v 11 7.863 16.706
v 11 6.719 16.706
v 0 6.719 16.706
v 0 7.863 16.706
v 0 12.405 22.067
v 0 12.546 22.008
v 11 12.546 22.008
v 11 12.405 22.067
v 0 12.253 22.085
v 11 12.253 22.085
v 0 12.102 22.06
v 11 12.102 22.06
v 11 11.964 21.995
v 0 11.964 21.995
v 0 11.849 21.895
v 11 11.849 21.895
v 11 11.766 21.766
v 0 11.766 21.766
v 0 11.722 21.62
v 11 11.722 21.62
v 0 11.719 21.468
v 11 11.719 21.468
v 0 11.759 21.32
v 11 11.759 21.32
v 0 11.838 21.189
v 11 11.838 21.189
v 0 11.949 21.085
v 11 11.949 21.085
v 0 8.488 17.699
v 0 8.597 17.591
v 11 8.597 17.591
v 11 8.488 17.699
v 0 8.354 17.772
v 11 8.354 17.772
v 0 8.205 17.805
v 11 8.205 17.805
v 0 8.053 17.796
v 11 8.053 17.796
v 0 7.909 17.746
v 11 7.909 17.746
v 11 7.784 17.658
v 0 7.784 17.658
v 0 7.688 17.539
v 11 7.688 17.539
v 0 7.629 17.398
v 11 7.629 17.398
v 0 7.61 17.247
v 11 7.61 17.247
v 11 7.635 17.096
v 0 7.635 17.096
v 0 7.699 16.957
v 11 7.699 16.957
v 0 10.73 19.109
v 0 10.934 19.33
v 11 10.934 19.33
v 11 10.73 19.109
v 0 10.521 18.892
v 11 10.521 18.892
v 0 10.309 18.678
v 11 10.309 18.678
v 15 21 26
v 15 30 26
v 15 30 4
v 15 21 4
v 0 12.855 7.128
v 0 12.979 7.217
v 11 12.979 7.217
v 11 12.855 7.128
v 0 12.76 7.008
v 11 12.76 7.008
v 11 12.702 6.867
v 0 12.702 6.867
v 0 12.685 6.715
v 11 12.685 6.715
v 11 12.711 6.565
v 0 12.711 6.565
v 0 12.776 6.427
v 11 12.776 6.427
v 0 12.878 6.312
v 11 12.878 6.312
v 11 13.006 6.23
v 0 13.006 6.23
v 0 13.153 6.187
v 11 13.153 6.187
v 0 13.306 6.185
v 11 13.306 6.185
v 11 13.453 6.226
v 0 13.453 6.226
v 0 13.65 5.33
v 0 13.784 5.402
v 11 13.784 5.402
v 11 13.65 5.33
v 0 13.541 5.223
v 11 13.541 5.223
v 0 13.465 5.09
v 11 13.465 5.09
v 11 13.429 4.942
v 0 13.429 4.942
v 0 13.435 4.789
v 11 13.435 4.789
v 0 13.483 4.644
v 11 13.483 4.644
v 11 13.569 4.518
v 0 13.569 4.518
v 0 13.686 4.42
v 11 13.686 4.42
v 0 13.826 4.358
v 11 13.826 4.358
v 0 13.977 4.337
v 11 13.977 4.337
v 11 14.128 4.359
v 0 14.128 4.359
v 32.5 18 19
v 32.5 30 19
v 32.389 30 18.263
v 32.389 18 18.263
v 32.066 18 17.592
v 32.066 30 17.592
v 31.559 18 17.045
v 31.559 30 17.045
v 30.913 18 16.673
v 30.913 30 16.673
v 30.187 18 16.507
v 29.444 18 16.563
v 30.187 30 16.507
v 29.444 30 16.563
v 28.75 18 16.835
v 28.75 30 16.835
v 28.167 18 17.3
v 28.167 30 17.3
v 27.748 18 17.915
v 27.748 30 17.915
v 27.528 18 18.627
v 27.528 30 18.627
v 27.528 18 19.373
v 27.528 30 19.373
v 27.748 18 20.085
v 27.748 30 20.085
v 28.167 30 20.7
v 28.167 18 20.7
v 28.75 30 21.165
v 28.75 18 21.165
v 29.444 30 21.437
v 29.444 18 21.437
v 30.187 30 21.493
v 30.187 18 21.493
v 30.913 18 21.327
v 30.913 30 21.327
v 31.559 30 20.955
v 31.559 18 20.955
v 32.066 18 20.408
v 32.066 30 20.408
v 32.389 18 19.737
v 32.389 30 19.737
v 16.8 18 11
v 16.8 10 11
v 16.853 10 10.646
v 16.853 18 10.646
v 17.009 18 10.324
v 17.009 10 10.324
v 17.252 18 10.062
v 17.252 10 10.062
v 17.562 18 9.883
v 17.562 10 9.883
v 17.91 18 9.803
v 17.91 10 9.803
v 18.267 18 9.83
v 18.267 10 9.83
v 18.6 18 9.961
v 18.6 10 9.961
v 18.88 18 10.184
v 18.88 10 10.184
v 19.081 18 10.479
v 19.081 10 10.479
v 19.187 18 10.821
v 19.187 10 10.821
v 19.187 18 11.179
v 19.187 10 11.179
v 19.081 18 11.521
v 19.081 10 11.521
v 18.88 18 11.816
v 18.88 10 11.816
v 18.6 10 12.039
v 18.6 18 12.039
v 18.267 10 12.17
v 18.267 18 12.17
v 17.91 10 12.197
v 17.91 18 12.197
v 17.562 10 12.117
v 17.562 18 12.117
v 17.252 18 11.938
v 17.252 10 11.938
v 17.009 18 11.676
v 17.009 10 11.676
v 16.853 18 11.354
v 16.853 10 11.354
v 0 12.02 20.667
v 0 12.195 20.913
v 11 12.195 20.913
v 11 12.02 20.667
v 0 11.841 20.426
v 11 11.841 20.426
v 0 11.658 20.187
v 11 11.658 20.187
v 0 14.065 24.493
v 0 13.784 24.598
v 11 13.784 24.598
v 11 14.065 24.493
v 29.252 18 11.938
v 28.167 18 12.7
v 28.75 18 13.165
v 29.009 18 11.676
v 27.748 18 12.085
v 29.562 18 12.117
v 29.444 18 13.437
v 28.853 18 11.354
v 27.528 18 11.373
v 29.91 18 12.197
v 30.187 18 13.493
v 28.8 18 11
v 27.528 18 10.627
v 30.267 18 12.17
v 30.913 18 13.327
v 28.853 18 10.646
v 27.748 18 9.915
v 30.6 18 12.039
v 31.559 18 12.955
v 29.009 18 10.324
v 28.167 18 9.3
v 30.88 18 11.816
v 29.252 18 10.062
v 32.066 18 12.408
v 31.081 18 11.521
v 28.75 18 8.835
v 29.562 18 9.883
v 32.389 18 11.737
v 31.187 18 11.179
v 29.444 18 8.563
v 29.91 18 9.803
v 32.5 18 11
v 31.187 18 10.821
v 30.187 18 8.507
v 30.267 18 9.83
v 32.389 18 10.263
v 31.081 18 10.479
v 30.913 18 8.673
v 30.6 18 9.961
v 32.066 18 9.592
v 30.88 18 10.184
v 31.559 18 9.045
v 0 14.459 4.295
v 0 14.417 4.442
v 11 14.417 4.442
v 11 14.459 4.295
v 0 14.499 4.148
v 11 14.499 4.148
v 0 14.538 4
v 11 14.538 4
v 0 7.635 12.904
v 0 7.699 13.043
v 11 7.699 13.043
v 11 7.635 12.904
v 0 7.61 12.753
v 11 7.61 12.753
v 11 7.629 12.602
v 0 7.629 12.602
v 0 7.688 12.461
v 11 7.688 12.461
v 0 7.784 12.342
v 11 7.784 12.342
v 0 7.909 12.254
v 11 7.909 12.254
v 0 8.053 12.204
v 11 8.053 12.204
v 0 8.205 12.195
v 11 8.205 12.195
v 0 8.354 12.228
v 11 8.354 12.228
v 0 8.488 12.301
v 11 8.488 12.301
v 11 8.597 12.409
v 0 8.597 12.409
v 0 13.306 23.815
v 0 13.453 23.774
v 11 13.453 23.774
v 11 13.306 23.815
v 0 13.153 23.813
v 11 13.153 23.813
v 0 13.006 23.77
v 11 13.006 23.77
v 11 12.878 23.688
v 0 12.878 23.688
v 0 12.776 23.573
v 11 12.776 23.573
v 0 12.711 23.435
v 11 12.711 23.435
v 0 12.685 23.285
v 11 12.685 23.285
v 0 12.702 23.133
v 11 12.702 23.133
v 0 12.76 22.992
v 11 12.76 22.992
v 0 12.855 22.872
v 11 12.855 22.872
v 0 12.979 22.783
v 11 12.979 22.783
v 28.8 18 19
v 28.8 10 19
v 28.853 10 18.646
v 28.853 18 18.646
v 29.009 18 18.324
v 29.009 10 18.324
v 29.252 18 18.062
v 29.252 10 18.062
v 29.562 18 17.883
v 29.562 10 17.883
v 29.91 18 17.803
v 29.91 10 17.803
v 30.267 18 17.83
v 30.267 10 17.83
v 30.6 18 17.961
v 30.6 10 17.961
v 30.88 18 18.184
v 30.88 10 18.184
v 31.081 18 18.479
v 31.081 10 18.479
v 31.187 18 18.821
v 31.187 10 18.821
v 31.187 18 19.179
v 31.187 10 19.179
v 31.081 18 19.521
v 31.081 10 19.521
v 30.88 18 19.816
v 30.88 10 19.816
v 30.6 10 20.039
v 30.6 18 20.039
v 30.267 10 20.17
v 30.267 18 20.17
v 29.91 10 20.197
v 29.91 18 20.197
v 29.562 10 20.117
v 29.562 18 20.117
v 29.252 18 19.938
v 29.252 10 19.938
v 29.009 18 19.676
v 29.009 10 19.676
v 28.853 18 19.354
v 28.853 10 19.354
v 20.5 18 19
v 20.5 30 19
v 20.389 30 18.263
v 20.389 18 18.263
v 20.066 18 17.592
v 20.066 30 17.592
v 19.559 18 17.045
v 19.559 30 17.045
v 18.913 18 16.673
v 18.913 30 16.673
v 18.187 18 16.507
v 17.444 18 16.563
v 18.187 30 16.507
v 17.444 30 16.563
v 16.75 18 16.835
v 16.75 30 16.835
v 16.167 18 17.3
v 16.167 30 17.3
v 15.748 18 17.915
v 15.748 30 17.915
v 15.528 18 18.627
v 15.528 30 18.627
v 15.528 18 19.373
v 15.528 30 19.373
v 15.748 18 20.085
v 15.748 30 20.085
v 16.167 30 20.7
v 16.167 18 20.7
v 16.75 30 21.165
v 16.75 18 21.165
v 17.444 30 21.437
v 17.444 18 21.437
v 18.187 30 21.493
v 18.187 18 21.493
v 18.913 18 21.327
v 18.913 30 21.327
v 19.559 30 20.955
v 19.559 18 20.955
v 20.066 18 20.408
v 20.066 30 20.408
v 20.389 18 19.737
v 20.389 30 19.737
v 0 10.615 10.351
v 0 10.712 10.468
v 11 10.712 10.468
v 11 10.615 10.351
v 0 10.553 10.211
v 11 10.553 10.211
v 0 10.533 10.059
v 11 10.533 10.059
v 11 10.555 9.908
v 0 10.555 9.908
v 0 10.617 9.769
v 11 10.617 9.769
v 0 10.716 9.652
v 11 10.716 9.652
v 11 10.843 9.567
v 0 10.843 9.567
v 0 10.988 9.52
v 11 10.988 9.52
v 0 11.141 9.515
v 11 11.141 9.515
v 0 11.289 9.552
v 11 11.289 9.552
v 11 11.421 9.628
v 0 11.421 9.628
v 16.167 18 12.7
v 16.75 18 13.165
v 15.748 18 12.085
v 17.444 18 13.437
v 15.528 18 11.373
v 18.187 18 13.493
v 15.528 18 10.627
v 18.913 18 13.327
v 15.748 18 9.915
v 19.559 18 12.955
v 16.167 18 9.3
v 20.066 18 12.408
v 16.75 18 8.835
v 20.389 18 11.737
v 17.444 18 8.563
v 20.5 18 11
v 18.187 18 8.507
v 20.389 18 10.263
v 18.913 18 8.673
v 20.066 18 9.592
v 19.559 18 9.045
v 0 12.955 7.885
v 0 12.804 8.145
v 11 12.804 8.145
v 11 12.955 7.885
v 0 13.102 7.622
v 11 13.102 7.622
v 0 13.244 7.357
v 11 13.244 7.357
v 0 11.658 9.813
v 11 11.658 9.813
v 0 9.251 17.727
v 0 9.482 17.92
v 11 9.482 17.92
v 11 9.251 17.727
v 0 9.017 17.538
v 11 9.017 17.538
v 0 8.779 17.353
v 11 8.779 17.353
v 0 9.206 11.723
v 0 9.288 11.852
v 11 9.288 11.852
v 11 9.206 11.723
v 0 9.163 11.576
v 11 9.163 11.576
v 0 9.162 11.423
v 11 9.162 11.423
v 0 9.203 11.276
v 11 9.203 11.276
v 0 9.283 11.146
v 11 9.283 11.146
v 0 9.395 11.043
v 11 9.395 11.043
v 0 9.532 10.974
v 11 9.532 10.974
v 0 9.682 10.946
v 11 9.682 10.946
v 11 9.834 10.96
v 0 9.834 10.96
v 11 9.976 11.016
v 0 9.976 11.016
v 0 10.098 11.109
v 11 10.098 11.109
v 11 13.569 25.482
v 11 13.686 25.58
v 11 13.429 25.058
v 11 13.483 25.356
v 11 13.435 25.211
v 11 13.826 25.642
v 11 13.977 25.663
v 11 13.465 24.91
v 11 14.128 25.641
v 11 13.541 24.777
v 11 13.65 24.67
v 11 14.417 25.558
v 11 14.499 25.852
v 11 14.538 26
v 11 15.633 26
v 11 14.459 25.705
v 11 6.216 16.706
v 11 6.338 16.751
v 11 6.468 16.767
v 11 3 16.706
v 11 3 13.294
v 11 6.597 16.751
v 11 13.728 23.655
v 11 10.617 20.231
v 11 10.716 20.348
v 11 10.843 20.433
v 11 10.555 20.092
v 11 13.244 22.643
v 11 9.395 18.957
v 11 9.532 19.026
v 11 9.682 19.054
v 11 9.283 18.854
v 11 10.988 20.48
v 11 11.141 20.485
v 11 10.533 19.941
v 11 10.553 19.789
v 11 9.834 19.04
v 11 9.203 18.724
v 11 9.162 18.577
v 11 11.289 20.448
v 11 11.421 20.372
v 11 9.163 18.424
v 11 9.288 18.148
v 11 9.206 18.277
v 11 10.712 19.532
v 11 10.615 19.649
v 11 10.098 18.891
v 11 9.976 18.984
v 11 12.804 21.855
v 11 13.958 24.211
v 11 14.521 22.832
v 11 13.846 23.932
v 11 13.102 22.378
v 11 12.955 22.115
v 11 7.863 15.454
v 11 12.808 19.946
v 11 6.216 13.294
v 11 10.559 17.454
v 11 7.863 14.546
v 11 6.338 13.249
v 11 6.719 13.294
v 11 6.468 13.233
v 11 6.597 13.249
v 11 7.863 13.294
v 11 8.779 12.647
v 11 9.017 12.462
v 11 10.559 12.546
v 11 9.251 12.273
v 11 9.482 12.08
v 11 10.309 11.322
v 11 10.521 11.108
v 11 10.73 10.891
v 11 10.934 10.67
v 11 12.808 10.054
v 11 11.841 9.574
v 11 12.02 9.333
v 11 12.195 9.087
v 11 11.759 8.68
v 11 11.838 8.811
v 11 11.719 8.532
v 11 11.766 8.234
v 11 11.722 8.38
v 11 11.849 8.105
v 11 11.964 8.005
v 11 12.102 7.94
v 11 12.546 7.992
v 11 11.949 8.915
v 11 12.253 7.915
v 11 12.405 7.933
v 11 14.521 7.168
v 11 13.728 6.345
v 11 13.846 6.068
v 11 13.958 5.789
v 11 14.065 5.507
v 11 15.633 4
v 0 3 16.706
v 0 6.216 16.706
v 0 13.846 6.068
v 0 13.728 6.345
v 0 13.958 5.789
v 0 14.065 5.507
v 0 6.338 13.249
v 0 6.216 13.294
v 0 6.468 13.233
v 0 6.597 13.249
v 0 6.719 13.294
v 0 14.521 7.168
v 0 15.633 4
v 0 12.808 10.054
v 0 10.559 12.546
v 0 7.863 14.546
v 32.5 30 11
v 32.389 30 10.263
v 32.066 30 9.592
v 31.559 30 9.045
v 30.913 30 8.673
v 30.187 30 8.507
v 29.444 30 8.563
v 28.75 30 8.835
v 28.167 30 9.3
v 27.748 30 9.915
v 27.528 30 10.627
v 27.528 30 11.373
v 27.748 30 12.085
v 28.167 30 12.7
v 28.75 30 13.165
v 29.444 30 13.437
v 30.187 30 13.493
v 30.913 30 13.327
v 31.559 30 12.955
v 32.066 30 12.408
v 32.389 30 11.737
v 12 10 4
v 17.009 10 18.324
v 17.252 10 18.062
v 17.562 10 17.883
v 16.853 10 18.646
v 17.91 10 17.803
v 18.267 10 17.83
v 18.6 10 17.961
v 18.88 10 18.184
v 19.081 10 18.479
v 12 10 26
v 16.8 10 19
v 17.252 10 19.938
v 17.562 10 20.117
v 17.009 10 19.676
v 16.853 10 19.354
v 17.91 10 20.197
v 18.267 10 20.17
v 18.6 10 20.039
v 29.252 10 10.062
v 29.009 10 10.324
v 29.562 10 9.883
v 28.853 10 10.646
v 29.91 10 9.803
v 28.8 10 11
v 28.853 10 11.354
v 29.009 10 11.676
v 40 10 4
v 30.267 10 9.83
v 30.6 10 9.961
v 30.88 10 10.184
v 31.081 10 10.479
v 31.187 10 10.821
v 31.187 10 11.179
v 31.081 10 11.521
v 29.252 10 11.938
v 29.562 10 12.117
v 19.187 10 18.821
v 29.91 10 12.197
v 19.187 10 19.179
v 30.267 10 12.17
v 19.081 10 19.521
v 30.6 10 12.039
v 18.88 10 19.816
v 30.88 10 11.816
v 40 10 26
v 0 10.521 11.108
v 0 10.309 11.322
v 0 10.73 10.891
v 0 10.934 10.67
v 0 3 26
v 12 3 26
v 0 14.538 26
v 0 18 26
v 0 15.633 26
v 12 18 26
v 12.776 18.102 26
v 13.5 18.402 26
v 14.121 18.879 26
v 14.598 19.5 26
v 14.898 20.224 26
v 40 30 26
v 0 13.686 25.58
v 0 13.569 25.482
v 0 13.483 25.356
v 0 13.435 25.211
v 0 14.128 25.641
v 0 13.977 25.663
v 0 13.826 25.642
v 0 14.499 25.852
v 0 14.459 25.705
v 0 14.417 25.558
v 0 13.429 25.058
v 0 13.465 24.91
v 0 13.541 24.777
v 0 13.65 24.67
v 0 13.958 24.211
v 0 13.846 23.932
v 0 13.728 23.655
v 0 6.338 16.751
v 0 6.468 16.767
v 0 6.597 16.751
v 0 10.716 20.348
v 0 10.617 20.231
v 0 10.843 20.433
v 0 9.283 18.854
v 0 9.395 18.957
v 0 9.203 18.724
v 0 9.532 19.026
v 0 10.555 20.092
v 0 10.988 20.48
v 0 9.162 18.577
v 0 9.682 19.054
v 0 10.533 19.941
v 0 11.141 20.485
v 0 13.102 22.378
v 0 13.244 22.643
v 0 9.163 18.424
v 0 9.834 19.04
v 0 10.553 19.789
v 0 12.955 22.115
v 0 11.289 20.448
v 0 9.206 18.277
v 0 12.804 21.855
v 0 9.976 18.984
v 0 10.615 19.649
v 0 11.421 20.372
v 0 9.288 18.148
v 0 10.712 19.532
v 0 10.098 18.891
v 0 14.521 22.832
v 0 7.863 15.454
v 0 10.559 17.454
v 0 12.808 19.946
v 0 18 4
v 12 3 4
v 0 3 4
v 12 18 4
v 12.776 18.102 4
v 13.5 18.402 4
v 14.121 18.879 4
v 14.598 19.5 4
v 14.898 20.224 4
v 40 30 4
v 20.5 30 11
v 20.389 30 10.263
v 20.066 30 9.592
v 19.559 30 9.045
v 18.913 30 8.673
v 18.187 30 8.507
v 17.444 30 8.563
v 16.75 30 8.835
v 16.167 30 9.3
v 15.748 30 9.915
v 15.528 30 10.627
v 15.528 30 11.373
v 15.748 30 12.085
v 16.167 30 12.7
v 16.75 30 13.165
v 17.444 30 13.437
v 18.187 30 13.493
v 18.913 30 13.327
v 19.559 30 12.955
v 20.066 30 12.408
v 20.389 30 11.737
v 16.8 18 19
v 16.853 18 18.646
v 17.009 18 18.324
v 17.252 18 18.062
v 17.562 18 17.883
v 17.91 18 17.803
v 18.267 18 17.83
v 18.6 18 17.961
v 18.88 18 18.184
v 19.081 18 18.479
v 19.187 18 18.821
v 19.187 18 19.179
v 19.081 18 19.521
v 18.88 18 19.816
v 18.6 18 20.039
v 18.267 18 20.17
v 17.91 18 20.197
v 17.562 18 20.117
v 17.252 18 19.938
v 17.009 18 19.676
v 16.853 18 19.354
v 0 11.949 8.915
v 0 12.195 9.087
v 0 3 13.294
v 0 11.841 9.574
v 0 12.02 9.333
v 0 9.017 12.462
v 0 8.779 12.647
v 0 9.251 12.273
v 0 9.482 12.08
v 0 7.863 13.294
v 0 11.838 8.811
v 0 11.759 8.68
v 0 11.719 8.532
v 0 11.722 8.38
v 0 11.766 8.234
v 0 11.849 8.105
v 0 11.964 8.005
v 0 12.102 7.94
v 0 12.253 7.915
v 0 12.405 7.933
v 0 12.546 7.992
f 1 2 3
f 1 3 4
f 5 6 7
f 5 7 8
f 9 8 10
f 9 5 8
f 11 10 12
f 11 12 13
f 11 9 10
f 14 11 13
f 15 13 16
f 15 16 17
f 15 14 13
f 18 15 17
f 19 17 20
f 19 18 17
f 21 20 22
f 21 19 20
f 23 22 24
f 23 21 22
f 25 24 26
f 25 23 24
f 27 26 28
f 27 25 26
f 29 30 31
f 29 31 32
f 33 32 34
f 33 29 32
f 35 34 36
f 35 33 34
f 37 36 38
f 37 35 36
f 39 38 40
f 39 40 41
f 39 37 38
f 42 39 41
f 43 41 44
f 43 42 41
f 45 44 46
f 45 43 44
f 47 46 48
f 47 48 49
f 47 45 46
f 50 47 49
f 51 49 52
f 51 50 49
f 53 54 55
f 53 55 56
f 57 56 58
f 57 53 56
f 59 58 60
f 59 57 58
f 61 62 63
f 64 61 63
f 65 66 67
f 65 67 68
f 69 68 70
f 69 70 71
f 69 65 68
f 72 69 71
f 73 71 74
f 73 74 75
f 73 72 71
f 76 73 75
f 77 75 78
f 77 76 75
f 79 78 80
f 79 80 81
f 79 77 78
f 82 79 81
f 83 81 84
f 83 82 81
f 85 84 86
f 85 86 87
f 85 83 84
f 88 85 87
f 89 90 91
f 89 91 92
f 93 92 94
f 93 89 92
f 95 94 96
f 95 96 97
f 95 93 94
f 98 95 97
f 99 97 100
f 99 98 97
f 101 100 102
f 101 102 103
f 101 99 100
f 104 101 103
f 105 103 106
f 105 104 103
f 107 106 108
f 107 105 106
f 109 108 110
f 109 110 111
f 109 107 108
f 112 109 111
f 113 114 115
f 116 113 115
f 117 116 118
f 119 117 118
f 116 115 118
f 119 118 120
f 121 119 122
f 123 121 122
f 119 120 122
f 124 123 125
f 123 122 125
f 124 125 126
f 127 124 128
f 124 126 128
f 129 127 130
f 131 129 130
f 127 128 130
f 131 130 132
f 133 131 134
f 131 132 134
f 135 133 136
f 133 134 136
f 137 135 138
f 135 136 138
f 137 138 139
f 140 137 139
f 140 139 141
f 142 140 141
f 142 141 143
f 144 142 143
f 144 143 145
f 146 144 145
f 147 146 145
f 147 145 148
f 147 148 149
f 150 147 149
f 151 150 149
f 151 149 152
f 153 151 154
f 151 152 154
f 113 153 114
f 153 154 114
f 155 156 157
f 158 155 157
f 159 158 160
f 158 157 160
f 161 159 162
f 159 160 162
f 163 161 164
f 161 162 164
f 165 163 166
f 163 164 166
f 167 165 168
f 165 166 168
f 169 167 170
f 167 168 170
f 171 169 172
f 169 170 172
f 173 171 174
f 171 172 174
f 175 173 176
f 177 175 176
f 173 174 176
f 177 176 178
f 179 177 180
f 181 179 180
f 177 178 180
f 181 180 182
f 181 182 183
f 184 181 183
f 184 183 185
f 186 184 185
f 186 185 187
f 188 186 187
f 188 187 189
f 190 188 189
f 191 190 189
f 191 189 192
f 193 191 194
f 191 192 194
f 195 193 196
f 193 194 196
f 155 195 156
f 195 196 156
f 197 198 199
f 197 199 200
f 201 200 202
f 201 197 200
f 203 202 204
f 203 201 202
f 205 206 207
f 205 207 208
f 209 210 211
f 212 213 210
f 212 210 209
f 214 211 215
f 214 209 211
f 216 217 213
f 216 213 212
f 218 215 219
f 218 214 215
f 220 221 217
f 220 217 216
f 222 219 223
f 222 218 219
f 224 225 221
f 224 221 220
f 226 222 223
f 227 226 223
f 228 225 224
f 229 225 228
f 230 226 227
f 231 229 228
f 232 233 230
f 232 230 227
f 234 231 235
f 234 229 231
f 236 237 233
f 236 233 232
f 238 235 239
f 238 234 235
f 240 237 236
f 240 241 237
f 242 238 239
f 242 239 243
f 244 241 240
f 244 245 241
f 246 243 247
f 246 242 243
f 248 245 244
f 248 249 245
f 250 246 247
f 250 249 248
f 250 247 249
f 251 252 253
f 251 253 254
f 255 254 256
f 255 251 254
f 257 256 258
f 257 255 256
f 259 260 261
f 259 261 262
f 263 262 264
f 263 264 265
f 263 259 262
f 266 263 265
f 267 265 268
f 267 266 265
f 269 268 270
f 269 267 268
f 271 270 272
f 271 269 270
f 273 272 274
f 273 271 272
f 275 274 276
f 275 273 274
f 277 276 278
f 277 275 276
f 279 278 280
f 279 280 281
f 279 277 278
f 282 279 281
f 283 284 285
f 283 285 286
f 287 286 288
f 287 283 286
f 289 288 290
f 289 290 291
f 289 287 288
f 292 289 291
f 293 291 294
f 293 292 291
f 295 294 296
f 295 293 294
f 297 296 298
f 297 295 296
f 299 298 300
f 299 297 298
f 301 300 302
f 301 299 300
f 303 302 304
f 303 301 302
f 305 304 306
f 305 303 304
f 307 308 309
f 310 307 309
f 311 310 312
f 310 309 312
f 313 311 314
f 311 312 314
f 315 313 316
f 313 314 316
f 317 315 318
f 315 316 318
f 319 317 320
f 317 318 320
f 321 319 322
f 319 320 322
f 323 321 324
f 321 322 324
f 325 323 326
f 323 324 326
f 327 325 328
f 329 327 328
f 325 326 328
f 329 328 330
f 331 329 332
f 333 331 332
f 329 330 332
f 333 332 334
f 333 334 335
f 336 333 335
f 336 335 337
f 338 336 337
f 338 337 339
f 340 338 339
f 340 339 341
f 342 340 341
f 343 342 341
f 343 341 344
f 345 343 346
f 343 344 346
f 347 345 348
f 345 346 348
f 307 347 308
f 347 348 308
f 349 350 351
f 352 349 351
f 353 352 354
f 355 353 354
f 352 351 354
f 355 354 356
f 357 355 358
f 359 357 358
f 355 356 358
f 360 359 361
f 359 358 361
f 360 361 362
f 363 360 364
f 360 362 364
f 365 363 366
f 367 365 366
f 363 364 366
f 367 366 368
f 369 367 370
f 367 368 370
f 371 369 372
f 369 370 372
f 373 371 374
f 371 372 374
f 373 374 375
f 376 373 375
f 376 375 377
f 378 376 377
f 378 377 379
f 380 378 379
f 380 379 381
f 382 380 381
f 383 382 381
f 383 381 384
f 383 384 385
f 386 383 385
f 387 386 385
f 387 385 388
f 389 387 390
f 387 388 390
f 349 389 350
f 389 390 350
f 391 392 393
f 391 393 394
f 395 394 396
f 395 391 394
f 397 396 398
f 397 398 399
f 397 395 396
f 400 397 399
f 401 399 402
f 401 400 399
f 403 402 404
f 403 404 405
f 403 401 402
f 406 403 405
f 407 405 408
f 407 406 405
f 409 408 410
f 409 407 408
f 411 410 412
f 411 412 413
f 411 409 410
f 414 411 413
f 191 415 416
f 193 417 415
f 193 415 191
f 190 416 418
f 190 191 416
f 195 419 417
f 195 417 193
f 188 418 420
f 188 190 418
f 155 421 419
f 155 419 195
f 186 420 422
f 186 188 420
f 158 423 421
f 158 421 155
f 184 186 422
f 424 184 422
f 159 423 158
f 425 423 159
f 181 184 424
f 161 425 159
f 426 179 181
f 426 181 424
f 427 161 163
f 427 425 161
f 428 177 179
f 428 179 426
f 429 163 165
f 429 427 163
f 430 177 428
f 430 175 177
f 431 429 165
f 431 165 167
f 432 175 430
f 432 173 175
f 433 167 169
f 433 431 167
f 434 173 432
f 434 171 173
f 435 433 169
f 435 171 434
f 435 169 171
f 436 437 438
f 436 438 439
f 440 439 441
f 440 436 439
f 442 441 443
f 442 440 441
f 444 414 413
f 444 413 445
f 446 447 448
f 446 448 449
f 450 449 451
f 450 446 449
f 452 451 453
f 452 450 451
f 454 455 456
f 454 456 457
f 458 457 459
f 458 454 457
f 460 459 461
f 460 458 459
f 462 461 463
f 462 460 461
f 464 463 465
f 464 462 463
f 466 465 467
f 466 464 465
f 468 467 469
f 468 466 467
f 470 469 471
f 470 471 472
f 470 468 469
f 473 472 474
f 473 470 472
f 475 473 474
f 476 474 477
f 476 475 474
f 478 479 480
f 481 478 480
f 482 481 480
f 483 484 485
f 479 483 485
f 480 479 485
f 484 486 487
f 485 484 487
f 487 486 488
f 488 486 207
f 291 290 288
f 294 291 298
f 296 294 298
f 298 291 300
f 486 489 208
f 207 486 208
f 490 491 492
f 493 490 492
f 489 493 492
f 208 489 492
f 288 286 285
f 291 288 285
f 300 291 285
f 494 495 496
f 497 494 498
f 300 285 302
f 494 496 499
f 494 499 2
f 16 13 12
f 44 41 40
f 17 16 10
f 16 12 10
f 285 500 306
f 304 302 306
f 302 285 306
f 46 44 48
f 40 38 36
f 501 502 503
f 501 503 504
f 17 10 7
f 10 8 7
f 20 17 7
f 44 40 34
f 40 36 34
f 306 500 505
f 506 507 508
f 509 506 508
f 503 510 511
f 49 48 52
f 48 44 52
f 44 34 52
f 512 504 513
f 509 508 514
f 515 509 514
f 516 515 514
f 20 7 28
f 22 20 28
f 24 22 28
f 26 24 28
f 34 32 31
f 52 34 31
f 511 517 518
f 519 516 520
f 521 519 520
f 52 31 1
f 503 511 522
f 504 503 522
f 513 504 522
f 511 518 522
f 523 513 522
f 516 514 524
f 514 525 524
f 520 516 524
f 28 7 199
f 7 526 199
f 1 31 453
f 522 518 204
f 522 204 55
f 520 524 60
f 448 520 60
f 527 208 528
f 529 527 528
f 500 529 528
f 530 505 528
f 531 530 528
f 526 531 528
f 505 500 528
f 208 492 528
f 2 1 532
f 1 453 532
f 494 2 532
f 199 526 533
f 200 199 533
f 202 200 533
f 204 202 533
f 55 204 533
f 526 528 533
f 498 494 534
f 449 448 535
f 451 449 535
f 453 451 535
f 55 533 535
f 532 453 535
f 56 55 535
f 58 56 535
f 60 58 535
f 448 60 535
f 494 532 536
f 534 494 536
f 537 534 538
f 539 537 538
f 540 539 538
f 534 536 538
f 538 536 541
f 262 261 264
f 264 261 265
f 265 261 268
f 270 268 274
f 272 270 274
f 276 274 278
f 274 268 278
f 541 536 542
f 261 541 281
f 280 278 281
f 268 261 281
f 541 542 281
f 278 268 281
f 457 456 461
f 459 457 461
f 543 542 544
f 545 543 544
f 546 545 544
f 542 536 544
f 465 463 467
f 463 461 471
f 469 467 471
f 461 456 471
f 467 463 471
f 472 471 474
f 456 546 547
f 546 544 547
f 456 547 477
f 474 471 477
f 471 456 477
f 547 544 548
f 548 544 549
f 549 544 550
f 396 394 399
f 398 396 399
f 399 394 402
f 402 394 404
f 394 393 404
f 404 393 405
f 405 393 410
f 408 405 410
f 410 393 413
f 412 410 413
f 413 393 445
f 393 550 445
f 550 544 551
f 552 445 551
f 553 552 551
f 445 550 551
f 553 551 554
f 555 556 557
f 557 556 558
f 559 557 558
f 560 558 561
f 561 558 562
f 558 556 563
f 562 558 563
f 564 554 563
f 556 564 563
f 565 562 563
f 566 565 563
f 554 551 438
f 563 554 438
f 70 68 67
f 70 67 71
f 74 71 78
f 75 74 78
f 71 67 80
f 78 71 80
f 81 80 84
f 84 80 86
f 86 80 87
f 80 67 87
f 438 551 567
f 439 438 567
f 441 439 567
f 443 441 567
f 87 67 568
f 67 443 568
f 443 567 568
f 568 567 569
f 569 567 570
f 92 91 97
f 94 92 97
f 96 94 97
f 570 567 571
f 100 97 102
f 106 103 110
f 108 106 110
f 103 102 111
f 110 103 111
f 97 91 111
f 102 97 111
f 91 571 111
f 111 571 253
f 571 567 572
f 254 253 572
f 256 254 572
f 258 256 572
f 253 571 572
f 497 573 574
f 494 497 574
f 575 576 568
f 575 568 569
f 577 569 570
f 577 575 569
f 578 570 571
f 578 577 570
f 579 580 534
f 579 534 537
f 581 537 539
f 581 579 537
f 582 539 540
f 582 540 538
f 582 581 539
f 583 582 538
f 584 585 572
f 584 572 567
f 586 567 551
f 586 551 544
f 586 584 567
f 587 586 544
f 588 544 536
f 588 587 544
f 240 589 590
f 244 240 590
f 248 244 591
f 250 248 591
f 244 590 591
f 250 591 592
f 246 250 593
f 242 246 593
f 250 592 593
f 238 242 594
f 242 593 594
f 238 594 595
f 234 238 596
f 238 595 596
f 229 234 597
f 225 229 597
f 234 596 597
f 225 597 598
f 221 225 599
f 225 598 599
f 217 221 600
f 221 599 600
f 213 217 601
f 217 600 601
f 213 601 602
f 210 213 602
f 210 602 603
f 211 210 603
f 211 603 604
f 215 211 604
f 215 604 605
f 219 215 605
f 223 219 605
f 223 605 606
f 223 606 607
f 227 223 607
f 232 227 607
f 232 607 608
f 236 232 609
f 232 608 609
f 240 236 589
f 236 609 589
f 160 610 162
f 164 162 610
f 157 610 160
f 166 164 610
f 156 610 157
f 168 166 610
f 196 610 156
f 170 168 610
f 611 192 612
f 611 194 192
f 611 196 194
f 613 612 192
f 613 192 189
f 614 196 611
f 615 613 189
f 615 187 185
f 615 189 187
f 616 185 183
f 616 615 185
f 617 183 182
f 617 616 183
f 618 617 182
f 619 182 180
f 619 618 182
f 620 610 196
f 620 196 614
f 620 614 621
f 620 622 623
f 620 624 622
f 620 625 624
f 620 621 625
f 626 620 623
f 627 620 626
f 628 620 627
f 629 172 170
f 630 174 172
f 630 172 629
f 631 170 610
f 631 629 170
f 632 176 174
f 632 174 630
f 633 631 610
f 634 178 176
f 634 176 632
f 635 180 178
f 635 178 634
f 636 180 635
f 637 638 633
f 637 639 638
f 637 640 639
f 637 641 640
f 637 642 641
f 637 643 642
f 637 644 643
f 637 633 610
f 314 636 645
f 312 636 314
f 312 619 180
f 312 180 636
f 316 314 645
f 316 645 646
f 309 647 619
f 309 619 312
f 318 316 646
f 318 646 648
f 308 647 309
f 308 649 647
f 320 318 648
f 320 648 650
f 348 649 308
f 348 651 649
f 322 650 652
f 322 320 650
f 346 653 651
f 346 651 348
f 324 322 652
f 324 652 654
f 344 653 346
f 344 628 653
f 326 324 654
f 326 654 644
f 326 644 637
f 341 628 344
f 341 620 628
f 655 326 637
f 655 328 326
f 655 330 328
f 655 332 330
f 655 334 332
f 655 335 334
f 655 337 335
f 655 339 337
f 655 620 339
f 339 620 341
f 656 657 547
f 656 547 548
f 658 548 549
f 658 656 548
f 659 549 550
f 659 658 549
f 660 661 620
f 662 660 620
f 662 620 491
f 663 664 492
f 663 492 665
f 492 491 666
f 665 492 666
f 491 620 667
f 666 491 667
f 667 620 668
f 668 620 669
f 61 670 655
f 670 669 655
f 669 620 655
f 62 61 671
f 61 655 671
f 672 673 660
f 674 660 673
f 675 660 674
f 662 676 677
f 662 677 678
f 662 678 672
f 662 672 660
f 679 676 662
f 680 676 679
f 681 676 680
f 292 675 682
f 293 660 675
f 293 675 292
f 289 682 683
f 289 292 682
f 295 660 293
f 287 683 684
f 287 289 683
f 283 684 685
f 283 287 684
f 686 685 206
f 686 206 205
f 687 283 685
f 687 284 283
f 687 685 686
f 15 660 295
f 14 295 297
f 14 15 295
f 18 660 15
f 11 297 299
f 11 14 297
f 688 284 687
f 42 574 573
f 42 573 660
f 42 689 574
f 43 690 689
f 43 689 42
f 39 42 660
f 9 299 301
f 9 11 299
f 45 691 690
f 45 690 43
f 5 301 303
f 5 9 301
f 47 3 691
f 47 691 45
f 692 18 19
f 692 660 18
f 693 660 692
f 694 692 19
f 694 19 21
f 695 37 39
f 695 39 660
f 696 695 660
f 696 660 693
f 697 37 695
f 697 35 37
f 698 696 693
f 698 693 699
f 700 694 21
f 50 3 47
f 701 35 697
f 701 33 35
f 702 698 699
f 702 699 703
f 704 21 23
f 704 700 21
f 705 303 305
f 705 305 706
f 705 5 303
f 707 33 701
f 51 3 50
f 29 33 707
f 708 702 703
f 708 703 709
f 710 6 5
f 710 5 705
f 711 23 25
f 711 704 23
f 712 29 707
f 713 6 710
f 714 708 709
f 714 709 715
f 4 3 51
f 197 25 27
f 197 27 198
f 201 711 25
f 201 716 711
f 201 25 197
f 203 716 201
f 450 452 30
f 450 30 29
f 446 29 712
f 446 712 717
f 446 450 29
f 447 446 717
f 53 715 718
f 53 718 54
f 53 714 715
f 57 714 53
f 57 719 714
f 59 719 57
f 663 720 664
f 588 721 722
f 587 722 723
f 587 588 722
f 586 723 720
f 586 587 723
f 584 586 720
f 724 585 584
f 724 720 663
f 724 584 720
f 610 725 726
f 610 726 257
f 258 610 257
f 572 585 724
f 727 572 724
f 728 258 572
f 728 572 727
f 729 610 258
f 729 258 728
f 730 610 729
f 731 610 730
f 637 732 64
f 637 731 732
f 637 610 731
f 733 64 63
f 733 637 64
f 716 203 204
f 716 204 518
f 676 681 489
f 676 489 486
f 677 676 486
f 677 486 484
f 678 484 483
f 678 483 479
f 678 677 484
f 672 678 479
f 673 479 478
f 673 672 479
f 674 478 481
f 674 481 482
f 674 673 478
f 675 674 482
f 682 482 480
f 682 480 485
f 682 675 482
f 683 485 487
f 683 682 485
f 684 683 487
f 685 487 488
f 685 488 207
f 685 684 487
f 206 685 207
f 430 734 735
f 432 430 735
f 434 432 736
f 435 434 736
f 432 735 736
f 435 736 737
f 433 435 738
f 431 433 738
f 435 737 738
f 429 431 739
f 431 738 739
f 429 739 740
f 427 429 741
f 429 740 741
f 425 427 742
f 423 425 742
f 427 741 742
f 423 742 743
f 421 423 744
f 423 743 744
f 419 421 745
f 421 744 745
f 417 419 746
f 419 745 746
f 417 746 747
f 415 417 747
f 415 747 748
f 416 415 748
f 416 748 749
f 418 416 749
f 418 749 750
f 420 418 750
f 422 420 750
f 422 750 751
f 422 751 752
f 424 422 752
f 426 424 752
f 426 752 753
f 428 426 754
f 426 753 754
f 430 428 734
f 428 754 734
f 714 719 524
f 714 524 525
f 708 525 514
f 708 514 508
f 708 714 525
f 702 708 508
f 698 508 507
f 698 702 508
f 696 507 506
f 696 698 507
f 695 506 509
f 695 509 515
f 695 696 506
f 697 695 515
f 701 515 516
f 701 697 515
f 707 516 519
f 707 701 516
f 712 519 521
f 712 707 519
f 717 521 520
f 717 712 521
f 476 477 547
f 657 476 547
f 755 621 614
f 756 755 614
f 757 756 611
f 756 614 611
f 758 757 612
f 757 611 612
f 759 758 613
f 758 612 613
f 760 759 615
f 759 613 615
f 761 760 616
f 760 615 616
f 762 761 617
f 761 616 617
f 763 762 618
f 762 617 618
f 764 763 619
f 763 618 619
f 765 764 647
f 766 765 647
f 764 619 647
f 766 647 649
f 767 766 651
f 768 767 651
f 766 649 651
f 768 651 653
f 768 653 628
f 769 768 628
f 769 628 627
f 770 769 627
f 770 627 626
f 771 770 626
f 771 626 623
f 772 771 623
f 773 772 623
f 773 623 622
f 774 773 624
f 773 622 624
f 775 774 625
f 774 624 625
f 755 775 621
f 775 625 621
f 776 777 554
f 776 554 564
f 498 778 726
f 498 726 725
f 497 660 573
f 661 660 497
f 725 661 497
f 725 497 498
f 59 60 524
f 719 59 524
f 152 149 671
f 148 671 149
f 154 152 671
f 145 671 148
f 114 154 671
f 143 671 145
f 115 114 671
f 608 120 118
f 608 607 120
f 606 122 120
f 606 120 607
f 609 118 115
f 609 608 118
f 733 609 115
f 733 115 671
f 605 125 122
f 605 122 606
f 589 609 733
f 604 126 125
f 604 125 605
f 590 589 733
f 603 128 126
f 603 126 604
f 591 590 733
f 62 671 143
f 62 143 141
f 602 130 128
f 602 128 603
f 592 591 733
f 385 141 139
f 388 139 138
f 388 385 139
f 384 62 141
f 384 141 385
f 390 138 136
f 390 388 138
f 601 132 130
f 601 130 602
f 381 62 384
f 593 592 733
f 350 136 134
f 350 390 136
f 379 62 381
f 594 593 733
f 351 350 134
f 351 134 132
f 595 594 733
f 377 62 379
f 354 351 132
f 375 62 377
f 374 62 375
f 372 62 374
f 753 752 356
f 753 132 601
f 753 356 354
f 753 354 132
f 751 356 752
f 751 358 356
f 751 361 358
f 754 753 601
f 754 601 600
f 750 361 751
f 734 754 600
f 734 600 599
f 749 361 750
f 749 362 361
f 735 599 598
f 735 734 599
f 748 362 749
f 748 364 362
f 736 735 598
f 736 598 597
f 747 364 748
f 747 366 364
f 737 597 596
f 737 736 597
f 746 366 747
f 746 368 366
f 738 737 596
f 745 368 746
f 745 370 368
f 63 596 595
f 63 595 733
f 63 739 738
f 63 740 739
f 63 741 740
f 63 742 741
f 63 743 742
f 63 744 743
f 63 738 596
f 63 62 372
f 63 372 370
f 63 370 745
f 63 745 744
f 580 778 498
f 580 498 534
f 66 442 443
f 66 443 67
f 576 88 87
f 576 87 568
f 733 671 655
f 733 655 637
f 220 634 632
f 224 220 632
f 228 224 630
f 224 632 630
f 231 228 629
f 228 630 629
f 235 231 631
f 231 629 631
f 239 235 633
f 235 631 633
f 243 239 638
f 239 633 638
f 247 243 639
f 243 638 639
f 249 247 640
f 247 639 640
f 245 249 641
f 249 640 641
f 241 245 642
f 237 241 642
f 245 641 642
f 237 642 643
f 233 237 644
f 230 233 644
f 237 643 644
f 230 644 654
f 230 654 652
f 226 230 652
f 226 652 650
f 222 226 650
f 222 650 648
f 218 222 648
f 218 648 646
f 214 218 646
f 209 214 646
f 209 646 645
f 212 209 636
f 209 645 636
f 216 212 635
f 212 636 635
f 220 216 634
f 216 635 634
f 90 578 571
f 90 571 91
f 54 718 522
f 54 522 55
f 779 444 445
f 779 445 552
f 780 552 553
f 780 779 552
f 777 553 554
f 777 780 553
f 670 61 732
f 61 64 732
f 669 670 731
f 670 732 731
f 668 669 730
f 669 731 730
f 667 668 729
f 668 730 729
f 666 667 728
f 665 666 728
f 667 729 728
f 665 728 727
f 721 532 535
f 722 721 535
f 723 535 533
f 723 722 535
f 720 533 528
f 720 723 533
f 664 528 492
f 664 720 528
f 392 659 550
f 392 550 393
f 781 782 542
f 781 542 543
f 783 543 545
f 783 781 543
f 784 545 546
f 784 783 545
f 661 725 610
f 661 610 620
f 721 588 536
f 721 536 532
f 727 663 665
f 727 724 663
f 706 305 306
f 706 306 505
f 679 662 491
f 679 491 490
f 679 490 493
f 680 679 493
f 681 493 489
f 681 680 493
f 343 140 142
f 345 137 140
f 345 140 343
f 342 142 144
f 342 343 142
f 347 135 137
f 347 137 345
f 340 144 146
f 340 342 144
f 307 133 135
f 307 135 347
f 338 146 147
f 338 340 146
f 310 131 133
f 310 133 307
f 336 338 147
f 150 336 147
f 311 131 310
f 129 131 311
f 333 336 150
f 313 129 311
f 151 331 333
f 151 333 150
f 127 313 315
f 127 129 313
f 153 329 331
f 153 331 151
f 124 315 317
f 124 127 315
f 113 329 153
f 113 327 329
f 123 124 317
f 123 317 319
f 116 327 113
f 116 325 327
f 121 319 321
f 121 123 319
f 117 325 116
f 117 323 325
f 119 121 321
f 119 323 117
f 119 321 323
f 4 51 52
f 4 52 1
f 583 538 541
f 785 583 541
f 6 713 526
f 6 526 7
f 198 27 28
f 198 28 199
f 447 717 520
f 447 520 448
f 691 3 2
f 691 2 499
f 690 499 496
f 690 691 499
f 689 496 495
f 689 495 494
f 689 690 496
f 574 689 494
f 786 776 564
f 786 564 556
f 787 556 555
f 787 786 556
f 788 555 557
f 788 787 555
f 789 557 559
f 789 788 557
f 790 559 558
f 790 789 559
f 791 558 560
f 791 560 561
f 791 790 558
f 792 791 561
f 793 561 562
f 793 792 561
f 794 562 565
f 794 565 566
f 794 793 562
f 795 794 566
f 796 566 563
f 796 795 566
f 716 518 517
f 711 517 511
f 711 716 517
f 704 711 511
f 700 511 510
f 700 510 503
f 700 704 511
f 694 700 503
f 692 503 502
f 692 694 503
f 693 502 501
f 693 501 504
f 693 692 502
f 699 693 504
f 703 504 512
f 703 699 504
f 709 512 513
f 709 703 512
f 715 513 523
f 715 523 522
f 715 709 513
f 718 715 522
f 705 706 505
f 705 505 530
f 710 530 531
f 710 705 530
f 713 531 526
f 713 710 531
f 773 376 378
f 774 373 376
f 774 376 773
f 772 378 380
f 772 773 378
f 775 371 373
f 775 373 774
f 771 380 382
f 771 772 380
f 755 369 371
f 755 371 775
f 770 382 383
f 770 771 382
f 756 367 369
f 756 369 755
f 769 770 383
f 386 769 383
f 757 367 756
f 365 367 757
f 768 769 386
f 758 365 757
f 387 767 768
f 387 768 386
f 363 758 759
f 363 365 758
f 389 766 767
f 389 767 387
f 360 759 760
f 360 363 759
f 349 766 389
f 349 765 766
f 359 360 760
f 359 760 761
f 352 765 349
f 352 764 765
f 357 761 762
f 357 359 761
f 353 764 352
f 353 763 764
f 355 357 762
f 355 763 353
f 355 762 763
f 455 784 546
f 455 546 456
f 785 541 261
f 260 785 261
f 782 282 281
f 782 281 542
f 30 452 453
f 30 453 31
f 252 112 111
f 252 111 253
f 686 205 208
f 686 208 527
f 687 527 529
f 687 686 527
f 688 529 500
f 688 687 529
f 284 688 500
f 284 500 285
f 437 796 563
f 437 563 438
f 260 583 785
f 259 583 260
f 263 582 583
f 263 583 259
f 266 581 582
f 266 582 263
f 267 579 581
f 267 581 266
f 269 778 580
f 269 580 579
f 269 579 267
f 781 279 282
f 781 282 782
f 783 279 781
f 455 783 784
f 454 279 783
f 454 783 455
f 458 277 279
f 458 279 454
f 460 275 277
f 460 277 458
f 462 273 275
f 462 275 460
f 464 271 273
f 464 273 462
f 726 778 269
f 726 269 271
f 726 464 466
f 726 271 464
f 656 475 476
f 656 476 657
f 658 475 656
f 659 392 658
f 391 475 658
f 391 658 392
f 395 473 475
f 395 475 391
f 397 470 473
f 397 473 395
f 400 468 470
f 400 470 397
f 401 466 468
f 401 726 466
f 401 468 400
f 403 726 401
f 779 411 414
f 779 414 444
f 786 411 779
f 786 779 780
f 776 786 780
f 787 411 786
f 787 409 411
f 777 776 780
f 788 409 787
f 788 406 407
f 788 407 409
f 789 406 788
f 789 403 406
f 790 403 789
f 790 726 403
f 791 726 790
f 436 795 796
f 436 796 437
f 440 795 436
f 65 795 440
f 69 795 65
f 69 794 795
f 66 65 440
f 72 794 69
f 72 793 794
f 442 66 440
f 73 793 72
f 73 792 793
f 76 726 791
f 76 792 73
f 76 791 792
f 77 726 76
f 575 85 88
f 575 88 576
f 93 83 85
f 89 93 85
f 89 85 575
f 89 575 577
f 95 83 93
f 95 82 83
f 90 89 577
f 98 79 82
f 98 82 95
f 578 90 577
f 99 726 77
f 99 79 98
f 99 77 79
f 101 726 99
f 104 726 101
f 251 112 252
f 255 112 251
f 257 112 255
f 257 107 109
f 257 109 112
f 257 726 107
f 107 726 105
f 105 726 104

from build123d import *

# Parameters (mm, degrees)
SKETCH_1_W                   = 20
SKETCH_1_H                   = 40
EXTRUDE_1_DEPTH              = 30
CUT_EXTRUDE_1_DEPTH          = 11
SKETCH_13_W                  = 20
SKETCH_13_H                  = 30
CUT_EXTRUDE_5_DEPTH          = 10
SKETCH_14_W                  = 30
SKETCH_14_H                  = 30
EXTRUDE_5_DEPTH              = 20
HOLE_WIZARD_M2_1_D           = 2.4
HOLE_WIZARD_M2_1_CSINK_D     = 2.45
HOLE_WIZARD_M2_1_CSINK_ANGLE = 90
SKETCH_19_R                  = 2.5
CUT_EXTRUDE_6_DEPTH          = 12
SKETCH_20_W                  = 4
SKETCH_20_H                  = 30
CUT_EXTRUDE_7_DEPTH          = 49
SKETCH_22_W                  = 28
SKETCH_22_H                  = 22
CUT_EXTRUDE_8_DEPTH          = 10
SKETCH_23_W                  = 12
SKETCH_23_H                  = 3
CUT_EXTRUDE_9_DEPTH          = 23
SKETCH_24_W                  = 3.41182091
SKETCH_24_H                  = 4.86270688
CUT_EXTRUDE_10_DEPTH         = 11
SKETCH_25_W                  = 15
SKETCH_25_H                  = 22
CUT_EXTRUDE_11_DEPTH         = 12
FILLET_1_R                   = 3


with BuildPart() as part:
    # 草图1 → 凸台-拉伸1 (new body)
    with BuildSketch(Plane.XY):
        with Locations((10, 20)):
            Rectangle(SKETCH_1_W, SKETCH_1_H)
    extrude(amount=EXTRUDE_1_DEPTH)

    # 草图3 → 切除-拉伸1 (cut)
    with BuildSketch(Plane.ZY):
        with BuildLine():
            Line((2.42076783, 14.560970744), (2.46639251, 14.857401496))
            ThreePointArc((2.46639251, 14.857401496), (2.019622743, 14.921117547), (1.571223609, 14.972119278))
            Line((1.571223609, 14.972119278), (1.540625063, 14.673762896))
            ThreePointArc((1.540625063, 14.673762896), (0.958467816, 14.180991438), (0.443670306, 14.743765188))
            Line((0.443670306, 14.743765188), (0.451244703, 15.043586442))
            ThreePointArc((0.451244703, 15.043586442), (0.225645108, 15.048393221), (0, 15.049995588))
            Line((0, 15.049995588), (0, 16.111542732))
            ThreePointArc((0, 16.111542732), (8.761075107, 13.671748208), (15, 7.054736002))
            ThreePointArc((15, 7.054736002), (21.238924893, 13.671748208), (30, 16.111542732))
            Line((30, 16.111542732), (30, 15.049995588))
            ThreePointArc((30, 15.049995588), (29.774354892, 15.048393221), (29.548755297, 15.043586442))
            Line((29.548755297, 15.043586442), (29.556329694, 14.743765188))
            ThreePointArc((29.556329694, 14.743765188), (29.041532184, 14.180991438), (28.459374937, 14.673762896))
            Line((28.459374937, 14.673762896), (28.428776391, 14.972119278))
            ThreePointArc((28.428776391, 14.972119278), (27.980377257, 14.921117547), (27.53360749, 14.857401496))
            Line((27.53360749, 14.857401496), (27.57923217, 14.560970744))
            ThreePointArc((27.57923217, 14.560970744), (27.140146166, 13.937324811), (26.500073756, 14.352099545))
            Line((26.500073756, 14.352099545), (26.431798568, 14.644146289))
            ThreePointArc((26.431798568, 14.644146289), (25.993519676, 14.536561099), (25.558473085, 14.416571838))
            Line((25.558473085, 14.416571838), (25.641407746, 14.128345115))
            ThreePointArc((25.641407746, 14.128345115), (25.285156719, 13.453944659), (24.597553302, 13.78399361))
            Line((24.597553302, 13.78399361), (24.492709128, 14.064992722))
            ThreePointArc((24.492709128, 14.064992722), (24.071660856, 13.902569472), (23.655395377, 13.728253635))
            Line((23.655395377, 13.728253635), (23.774294539, 13.45290696))
            ThreePointArc((23.774294539, 13.45290696), (23.506658094, 12.738693055), (22.78267894, 12.978661705))
            Line((22.78267894, 12.978661705), (22.642966709, 13.244054422))
            ThreePointArc((22.642966709, 13.244054422), (22.245979893, 13.029428171), (21.855248772, 12.803613755))
            Line((21.855248772, 12.803613755), (22.008183484, 12.545614189))
            ThreePointArc((22.008183484, 12.545614189), (21.833503597, 11.803173817), (21.084894113, 11.949169057))
            Line((21.084894113, 11.949169057), (20.912580434, 12.194649806))
            ThreePointArc((20.912580434, 12.194649806), (20.546095554, 11.931302521), (20.187237779, 11.657653005))
            Line((20.187237779, 11.657653005), (20.37172692, 11.421186181))
            ThreePointArc((20.37172692, 11.421186181), (20.292837493, 10.662564255), (19.531742677, 10.712217544))
            Line((19.531742677, 10.712217544), (19.329623065, 10.93380379))
            ThreePointArc((19.329623065, 10.93380379), (18.999585753, 10.626007863), (18.678423221, 10.308962775))
            Line((18.678423221, 10.308962775), (18.891473749, 10.097864989))
            ThreePointArc((18.891473749, 10.097864989), (18.909654637, 9.335368941), (18.148422038, 9.287874734))
            Line((18.148422038, 9.287874734), (17.919775562, 9.481971593))
            ThreePointArc((17.919775562, 9.481971593), (17.631540148, 9.134720523), (17.35328321, 8.779423413))
            Line((17.35328321, 8.779423413), (17.591438718, 8.597119392))
            ThreePointArc((17.591438718, 8.597119392), (17.706394965, 7.843119504), (16.957374371, 7.699248319))
            Line((16.957374371, 7.699248319), (16.705910455, 7.86270688))
            ThreePointArc((16.705910455, 7.86270688), (16.4641531, 7.481634261), (16.233316031, 7.093849259))
            Line((16.233316031, 7.093849259), (16.492712825, 6.943296595))
            ThreePointArc((16.492712825, 6.943296595), (16.68180457, 6.174165972), (15.906222101, 6.013575078))
            Line((15.906222101, 6.013575078), (15.906222101, 3.404183419))
            Line((15.906222101, 3.404183419), (14.093777899, 3.404183419))
            Line((14.093777899, 3.404183419), (14.093777899, 6.013575078))
            ThreePointArc((14.093777899, 6.013575078), (13.31819543, 6.174165972), (13.507287175, 6.943296595))
            Line((13.507287175, 6.943296595), (13.766683969, 7.093849259))
            ThreePointArc((13.766683969, 7.093849259), (13.5358469, 7.481634261), (13.294089545, 7.86270688))
            Line((13.294089545, 7.86270688), (13.042625629, 7.699248319))
            ThreePointArc((13.042625629, 7.699248319), (12.293605035, 7.843119504), (12.408561282, 8.597119392))
            Line((12.408561282, 8.597119392), (12.64671679, 8.779423413))
            ThreePointArc((12.64671679, 8.779423413), (12.368459852, 9.134720523), (12.080224438, 9.481971593))
            Line((12.080224438, 9.481971593), (11.851577962, 9.287874734))
            ThreePointArc((11.851577962, 9.287874734), (11.090345363, 9.335368941), (11.108526251, 10.097864989))
            Line((11.108526251, 10.097864989), (11.321576779, 10.308962775))
            ThreePointArc((11.321576779, 10.308962775), (11.000414247, 10.626007863), (10.670376935, 10.93380379))
            Line((10.670376935, 10.93380379), (10.468257323, 10.712217544))
            ThreePointArc((10.468257323, 10.712217544), (9.707162507, 10.662564255), (9.62827308, 11.421186181))
            Line((9.62827308, 11.421186181), (9.812762221, 11.657653005))
            ThreePointArc((9.812762221, 11.657653005), (9.453904446, 11.931302521), (9.087419566, 12.194649806))
            Line((9.087419566, 12.194649806), (8.915105887, 11.949169057))
            ThreePointArc((8.915105887, 11.949169057), (8.166496403, 11.803173817), (7.991816516, 12.545614189))
            Line((7.991816516, 12.545614189), (8.144751228, 12.803613755))
            ThreePointArc((8.144751228, 12.803613755), (7.754020107, 13.029428171), (7.357033291, 13.244054422))
            Line((7.357033291, 13.244054422), (7.21732106, 12.978661705))
            ThreePointArc((7.21732106, 12.978661705), (6.493341906, 12.738693055), (6.225705461, 13.45290696))
            Line((6.225705461, 13.45290696), (6.344604623, 13.728253635))
            ThreePointArc((6.344604623, 13.728253635), (5.928339144, 13.902569472), (5.507290872, 14.064992722))
            Line((5.507290872, 14.064992722), (5.402446698, 13.78399361))
            ThreePointArc((5.402446698, 13.78399361), (4.714843281, 13.453944659), (4.358592254, 14.128345115))
            Line((4.358592254, 14.128345115), (4.441526915, 14.416571838))
            ThreePointArc((4.441526915, 14.416571838), (4.006480324, 14.536561099), (3.568201432, 14.644146289))
            Line((3.568201432, 14.644146289), (3.499926244, 14.352099545))
            ThreePointArc((3.499926244, 14.352099545), (2.859853834, 13.937324811), (2.42076783, 14.560970744))
        make_face()
    extrude(amount=-CUT_EXTRUDE_1_DEPTH, mode=Mode.SUBTRACT)

    # 草图13 → 切除-拉伸5 (cut)
    with BuildSketch(Plane(origin=(0, 40, 0), x_dir=(1, 0, 0), z_dir=(0, 1, 0))):
        with Locations((10, -15)):
            Rectangle(SKETCH_13_W, SKETCH_13_H)
    extrude(amount=-CUT_EXTRUDE_5_DEPTH, mode=Mode.SUBTRACT)

    # 草图14 → 凸台-拉伸5 (add)
    with BuildSketch(Plane(origin=(20, 0, 0), x_dir=(0, 0, -1), z_dir=(1, 0, 0))):
        with Locations((-15, 15)):
            Rectangle(SKETCH_14_W, SKETCH_14_H)
    extrude(amount=EXTRUDE_5_DEPTH)

    # M2 间隙孔1 (through all)
    with Locations(Plane(origin=(0, 30, 0), x_dir=(1, 0, 0), z_dir=(0, 1, 0))):
        with Locations((18, -11), (30, -11), (18, -19), (30, -19)):
            CounterSinkHole(HOLE_WIZARD_M2_1_D / 2, HOLE_WIZARD_M2_1_CSINK_D / 2, counter_sink_angle=HOLE_WIZARD_M2_1_CSINK_ANGLE)

    # 草图19 → 切除-拉伸6 (cut)
    with BuildSketch(Plane(origin=(0, 30, 0), x_dir=(1, 0, 0), z_dir=(0, 1, 0))):
        with Locations((18, -11)):
            Circle(SKETCH_19_R)
        with Locations((30, -11)):
            Circle(SKETCH_19_R)
        with Locations((30, -19)):
            Circle(SKETCH_19_R)
        with Locations((18, -19)):
            Circle(SKETCH_19_R)
    extrude(amount=-CUT_EXTRUDE_6_DEPTH, mode=Mode.SUBTRACT)

    # 草图20 → 切除-拉伸7 (cut)
    with BuildSketch(Plane(origin=(40, 0, 0), x_dir=(0, 0, -1), z_dir=(1, 0, 0))):
        with Locations((-28, 15)):
            Rectangle(SKETCH_20_W, SKETCH_20_H)
        with Locations((-2, 15)):
            Rectangle(SKETCH_20_W, SKETCH_20_H)
    extrude(amount=-CUT_EXTRUDE_7_DEPTH, mode=Mode.SUBTRACT)

    # 草图22 → 切除-拉伸8 (cut)
    with BuildSketch(Plane.XZ):
        with Locations((26, 15)):
            Rectangle(SKETCH_22_W, SKETCH_22_H)
    extrude(amount=-CUT_EXTRUDE_8_DEPTH, mode=Mode.SUBTRACT)

    # 草图23 → 切除-拉伸9 (cut, through all)
    with BuildSketch(Plane.XY.offset(26)):
        with Locations((6, 1.5)):
            Rectangle(SKETCH_23_W, SKETCH_23_H)
    extrude(amount=-CUT_EXTRUDE_9_DEPTH, mode=Mode.SUBTRACT)

    # 草图24 → 切除-拉伸10 (cut)
    with BuildSketch(Plane.ZY):
        with Locations((15, 5.43135344)):
            Rectangle(SKETCH_24_W, SKETCH_24_H)
    extrude(amount=-CUT_EXTRUDE_10_DEPTH, mode=Mode.SUBTRACT)

    # 草图25 → 切除-拉伸11 (cut)
    with BuildSketch(Plane(origin=(0, 30, 0), x_dir=(1, 0, 0), z_dir=(0, 1, 0))):
        with Locations((7.5, -15)):
            Rectangle(SKETCH_25_W, SKETCH_25_H)
    extrude(amount=-CUT_EXTRUDE_11_DEPTH, mode=Mode.SUBTRACT)

    # 圆角1
    fillet_1_edges = [part.edges().sort_by_distance(p)[0] for p in [
        (15, 18, 15),
    ]]
    fillet(fillet_1_edges, radius=FILLET_1_R)


solid = part.part
